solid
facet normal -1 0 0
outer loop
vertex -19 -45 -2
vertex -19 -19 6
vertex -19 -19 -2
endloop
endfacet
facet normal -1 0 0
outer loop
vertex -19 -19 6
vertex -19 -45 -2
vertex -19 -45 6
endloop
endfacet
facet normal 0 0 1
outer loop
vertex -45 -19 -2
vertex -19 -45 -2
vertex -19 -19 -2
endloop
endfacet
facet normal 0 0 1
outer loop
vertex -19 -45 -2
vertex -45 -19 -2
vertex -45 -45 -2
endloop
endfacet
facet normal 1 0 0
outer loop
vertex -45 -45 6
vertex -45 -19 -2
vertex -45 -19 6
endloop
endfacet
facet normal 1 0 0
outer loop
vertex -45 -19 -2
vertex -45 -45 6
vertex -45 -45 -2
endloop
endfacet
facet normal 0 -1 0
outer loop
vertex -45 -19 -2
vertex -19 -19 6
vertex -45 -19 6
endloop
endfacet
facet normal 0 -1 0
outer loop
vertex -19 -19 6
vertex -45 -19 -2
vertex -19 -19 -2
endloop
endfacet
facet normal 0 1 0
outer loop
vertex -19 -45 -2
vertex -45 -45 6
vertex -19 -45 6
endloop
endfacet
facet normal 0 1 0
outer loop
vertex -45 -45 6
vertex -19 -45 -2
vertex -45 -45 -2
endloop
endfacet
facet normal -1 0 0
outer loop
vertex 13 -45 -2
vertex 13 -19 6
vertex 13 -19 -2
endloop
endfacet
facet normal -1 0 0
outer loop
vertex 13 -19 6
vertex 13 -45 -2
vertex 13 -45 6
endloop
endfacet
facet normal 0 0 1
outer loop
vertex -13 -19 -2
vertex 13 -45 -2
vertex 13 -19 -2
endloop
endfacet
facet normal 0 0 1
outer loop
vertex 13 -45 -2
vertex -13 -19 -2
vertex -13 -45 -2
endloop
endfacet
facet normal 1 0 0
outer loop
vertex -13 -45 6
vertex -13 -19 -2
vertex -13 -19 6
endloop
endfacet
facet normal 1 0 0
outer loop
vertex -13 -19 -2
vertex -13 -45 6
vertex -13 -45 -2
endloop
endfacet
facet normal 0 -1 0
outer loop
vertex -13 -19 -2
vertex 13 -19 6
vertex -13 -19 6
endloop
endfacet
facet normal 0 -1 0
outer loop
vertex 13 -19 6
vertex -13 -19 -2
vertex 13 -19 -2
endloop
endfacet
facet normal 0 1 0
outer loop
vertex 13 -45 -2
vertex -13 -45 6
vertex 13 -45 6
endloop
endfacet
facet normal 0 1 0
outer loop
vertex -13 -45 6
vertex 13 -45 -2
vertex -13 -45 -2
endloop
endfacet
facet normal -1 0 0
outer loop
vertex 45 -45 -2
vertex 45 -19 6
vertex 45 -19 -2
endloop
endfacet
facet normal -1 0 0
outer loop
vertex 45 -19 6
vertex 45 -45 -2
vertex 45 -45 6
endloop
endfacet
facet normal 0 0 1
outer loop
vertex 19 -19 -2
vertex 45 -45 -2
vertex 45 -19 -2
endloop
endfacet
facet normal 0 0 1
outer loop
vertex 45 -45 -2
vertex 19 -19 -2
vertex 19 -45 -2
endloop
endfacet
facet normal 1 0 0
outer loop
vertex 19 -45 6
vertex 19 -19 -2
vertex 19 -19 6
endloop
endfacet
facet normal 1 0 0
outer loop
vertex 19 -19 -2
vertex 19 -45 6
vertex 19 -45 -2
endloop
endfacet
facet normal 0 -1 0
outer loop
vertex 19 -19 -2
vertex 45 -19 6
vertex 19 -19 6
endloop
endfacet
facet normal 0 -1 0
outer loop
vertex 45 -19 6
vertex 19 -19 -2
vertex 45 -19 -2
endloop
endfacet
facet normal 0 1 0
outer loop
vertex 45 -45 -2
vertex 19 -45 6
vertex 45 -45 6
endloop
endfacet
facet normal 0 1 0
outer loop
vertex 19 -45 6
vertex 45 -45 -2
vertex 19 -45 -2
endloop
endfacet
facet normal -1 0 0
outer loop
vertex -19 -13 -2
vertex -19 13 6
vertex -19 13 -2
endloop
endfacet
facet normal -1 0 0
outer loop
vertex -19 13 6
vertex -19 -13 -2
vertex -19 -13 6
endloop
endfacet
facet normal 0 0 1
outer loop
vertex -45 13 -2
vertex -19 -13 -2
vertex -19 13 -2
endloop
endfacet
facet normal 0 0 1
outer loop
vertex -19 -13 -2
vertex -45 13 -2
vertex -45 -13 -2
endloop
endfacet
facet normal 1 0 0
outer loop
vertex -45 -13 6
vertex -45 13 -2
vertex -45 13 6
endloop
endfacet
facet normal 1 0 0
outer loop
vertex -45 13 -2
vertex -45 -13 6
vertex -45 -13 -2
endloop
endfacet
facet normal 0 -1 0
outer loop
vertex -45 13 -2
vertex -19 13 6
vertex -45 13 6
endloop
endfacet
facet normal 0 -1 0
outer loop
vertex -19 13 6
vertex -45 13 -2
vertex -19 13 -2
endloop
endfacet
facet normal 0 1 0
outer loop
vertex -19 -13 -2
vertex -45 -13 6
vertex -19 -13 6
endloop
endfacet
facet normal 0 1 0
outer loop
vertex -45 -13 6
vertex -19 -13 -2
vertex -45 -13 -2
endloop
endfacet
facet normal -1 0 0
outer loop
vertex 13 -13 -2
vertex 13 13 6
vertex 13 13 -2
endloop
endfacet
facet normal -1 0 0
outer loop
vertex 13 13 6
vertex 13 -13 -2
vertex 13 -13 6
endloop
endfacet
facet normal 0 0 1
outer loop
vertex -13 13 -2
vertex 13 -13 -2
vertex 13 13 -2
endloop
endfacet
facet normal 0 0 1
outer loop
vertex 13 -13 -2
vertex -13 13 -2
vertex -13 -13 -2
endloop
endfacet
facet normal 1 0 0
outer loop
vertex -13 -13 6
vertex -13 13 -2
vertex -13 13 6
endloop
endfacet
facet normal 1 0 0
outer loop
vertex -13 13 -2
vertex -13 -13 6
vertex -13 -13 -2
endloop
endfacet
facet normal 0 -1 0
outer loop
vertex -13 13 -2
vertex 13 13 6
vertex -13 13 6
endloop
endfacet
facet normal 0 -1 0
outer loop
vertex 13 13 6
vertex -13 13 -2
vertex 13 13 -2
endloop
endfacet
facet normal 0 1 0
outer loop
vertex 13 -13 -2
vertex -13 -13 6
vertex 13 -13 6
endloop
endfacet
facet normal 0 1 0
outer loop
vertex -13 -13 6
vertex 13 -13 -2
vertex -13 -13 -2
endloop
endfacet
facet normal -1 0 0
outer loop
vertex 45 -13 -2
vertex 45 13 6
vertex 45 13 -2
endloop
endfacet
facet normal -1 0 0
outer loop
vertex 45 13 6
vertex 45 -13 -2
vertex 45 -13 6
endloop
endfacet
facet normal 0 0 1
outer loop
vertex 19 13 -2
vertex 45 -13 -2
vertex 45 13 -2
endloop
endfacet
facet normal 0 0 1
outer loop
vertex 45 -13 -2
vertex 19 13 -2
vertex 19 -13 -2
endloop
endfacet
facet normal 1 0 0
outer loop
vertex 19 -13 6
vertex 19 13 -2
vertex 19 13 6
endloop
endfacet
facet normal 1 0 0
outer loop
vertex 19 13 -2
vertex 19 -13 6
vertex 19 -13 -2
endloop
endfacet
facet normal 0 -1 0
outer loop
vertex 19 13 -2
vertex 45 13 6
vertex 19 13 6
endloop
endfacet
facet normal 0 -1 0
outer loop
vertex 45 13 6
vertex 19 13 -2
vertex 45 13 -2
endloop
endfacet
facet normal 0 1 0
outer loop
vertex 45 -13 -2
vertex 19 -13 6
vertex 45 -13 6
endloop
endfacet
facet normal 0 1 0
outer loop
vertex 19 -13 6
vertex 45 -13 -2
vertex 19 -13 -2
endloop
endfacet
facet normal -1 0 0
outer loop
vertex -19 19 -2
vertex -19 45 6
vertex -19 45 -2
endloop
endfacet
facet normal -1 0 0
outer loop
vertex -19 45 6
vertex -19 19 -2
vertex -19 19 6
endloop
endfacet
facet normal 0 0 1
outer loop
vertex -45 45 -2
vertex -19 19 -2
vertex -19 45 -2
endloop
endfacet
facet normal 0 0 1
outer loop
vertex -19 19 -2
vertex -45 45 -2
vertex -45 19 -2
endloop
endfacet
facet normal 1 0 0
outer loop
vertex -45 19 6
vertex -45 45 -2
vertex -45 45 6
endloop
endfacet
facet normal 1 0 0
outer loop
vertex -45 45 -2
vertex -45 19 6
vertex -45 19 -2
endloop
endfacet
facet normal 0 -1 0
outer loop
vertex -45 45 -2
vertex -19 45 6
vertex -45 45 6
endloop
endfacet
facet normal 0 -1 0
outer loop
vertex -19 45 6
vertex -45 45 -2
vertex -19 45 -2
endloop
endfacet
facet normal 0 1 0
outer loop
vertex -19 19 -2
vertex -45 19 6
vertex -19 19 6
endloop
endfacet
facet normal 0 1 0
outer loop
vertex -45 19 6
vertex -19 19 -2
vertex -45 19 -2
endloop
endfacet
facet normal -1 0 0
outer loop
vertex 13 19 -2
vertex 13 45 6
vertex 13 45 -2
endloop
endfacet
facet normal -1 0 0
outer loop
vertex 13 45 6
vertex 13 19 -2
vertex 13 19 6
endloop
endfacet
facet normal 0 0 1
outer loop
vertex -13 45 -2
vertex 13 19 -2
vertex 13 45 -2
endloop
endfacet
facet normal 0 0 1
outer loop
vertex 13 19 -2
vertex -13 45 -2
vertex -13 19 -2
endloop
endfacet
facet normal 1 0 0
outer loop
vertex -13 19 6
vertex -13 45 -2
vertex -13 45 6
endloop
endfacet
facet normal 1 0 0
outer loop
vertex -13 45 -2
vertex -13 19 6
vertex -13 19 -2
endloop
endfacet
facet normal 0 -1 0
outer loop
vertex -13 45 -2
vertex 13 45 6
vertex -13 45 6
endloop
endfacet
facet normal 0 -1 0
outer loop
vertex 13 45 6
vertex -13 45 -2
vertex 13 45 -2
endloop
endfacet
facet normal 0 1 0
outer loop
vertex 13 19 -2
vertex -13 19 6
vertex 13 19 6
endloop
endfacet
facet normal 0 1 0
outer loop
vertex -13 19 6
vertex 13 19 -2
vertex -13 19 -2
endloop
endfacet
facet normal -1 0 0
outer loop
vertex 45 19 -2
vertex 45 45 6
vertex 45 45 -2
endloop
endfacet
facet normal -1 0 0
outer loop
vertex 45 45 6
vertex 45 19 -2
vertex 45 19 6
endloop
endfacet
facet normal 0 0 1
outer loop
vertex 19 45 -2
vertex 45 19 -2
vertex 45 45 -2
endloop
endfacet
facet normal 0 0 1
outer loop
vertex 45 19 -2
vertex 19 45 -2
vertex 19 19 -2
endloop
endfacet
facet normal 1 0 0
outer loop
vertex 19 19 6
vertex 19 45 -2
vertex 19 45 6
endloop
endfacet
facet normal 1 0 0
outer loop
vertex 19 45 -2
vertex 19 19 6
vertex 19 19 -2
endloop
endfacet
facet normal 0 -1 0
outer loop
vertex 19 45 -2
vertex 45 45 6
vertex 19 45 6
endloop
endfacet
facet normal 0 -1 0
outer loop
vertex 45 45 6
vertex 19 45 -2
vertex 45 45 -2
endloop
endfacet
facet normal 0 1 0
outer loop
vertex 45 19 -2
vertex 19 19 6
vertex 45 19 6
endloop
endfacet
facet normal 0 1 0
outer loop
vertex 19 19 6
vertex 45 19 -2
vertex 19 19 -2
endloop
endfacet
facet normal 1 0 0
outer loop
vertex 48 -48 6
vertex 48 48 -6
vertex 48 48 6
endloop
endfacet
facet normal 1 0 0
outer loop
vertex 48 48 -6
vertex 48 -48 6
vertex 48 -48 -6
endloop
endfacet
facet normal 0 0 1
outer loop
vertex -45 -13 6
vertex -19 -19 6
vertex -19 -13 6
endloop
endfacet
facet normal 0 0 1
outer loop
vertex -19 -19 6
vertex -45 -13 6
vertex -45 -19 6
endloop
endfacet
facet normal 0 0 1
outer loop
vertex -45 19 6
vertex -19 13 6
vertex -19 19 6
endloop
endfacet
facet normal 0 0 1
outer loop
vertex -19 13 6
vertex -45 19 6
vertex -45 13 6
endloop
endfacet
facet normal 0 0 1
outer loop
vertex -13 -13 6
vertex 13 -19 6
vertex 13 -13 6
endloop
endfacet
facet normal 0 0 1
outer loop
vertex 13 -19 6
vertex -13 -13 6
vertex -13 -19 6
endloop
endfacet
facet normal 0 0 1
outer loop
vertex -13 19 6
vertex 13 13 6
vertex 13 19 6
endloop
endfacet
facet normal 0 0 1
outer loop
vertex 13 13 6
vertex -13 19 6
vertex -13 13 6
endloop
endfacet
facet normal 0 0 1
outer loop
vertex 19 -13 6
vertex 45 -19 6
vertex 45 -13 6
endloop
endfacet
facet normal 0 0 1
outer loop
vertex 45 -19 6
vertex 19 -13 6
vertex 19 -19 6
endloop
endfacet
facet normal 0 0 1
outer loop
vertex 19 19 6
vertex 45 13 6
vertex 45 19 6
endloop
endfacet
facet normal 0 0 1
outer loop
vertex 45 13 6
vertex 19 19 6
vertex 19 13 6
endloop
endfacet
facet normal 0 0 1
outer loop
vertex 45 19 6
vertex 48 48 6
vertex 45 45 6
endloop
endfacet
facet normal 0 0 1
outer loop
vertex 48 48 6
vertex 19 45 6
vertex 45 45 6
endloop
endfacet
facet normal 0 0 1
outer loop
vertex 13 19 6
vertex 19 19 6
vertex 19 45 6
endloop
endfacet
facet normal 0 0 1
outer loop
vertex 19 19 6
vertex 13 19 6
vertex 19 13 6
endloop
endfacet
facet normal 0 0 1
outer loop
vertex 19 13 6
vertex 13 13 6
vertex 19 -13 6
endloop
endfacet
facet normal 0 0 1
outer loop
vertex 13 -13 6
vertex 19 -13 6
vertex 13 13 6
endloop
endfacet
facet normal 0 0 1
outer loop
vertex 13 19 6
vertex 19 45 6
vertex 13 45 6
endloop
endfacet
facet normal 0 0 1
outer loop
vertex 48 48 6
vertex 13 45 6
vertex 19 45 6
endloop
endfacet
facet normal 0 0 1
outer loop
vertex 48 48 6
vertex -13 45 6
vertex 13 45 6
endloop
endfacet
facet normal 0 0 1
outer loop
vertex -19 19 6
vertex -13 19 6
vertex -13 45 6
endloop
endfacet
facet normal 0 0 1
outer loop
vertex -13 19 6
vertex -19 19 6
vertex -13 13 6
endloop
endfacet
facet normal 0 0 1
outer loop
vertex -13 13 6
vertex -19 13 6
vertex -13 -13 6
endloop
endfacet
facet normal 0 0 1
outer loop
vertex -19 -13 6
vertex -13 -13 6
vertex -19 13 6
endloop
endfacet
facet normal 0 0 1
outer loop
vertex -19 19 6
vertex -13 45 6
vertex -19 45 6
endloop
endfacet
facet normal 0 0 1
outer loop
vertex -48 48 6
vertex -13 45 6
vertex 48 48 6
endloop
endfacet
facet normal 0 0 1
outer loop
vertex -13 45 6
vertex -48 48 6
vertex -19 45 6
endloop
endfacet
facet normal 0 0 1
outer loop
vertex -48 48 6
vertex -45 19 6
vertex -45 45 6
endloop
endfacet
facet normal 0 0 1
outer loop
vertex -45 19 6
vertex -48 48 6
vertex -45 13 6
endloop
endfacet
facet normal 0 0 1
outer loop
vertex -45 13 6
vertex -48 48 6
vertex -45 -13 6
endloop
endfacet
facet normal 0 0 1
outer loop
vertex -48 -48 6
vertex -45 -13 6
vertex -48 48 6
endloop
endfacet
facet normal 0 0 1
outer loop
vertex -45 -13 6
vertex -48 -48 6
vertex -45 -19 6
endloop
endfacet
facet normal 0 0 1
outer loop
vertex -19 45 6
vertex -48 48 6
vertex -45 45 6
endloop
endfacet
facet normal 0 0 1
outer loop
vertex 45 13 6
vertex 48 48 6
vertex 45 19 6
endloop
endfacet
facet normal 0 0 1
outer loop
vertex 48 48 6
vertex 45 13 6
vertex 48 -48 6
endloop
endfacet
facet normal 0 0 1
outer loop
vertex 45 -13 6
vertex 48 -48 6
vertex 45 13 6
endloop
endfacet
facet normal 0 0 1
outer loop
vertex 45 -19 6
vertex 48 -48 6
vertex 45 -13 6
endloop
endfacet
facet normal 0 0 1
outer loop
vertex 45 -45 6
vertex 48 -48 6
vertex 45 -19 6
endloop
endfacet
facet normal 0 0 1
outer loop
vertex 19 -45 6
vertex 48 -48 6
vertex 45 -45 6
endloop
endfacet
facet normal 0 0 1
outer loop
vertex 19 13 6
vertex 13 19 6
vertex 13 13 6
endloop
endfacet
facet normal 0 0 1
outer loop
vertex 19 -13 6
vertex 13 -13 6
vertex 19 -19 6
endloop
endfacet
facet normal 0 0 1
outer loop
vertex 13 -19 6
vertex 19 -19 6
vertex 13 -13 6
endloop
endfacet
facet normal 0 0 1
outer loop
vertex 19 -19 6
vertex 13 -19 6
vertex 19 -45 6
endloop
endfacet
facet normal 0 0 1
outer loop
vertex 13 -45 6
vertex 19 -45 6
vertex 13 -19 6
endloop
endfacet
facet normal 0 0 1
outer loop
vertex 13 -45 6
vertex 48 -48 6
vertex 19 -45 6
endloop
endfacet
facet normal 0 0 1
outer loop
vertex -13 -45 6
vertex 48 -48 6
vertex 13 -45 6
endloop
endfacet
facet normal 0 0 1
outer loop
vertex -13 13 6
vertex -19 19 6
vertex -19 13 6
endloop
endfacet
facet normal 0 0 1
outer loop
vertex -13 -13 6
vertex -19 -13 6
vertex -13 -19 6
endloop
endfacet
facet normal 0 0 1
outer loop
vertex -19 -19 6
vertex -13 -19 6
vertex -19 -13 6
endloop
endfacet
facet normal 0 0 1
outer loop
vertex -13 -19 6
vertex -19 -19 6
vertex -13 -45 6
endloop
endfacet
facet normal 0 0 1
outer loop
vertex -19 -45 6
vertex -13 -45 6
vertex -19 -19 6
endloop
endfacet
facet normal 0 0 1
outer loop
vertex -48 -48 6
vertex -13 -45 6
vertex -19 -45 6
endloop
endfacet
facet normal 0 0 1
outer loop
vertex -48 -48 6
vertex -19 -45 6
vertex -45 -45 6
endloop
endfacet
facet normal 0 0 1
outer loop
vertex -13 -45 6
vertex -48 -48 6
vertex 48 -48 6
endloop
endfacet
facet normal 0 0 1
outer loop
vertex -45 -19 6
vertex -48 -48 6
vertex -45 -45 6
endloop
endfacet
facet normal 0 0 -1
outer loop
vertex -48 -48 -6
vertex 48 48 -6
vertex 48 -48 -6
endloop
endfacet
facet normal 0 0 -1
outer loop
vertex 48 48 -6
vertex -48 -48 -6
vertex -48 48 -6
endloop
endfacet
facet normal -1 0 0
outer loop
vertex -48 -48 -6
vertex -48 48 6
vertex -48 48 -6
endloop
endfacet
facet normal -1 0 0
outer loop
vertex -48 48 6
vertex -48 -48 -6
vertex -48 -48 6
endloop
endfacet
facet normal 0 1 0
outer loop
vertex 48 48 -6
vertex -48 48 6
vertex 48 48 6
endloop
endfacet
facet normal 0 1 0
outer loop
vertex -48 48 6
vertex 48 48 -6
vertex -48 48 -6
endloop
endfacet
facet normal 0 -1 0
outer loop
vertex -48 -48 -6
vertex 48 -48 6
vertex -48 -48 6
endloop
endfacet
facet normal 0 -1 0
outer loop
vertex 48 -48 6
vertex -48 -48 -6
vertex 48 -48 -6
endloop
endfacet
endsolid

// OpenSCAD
$fn = 32;

// ----------------------------------------------------------------------
// Pocket plate 96 x 96 x 12
// 3 x 3 pockets 26 mm square, 8 mm deep
// ----------------------------------------------------------------------

// --- parameters (mm) ---
thickness = 12;  // plate thickness
floor_t = 4;     // material left under each pocket
pocket = 26;     // pocket side length
pitch_x = 32;    // pocket pitch along X
pitch_y = 32;    // pocket pitch along Y
cols = 3;        // pockets per row
rows = 3;        // rows of pockets

// --- derived feature positions (mm) ---
depth = thickness - floor_t;        // = 8   pocket depth, down to the floor
span_x = (cols - 1) * pitch_x;      // = 64   distance between outer pockets
span_y = (rows - 1) * pitch_y;      // = 64   distance between outer pocket rows
origin_x = -span_x / 2;             // = -32   X of the first pocket
origin_y = -span_y / 2;             // = -32   Y of the first pocket
plate = [span_x + pocket + 6, span_y + pocket + 6, thickness];  // = [96, 96, 12]   overall size: pockets plus 3 mm of wall on each side
feature_centers = [
  [origin_x + 0 * pitch_x, origin_y + 0 * pitch_y],
  [origin_x + 1 * pitch_x, origin_y + 0 * pitch_y],
  [origin_x + 2 * pitch_x, origin_y + 0 * pitch_y],
  [origin_x + 0 * pitch_x, origin_y + 1 * pitch_y],
  [origin_x + 1 * pitch_x, origin_y + 1 * pitch_y],
  [origin_x + 2 * pitch_x, origin_y + 1 * pitch_y],
  [origin_x + 0 * pitch_x, origin_y + 2 * pitch_y],
  [origin_x + 1 * pitch_x, origin_y + 2 * pitch_y],
  [origin_x + 2 * pitch_x, origin_y + 2 * pitch_y]
];   // pocket centres, used verbatim by the cutter loop

// plate outline, then one pocket per centre in feature_centers
difference() {
  cube(plate, center = true);
  for (centre = feature_centers)
    translate([centre[0] - pocket / 2, centre[1] - pocket / 2, plate[2] / 2 - depth])
      cube([pocket, pocket, depth + 1]);  // centred on the declared pocket centre
}
